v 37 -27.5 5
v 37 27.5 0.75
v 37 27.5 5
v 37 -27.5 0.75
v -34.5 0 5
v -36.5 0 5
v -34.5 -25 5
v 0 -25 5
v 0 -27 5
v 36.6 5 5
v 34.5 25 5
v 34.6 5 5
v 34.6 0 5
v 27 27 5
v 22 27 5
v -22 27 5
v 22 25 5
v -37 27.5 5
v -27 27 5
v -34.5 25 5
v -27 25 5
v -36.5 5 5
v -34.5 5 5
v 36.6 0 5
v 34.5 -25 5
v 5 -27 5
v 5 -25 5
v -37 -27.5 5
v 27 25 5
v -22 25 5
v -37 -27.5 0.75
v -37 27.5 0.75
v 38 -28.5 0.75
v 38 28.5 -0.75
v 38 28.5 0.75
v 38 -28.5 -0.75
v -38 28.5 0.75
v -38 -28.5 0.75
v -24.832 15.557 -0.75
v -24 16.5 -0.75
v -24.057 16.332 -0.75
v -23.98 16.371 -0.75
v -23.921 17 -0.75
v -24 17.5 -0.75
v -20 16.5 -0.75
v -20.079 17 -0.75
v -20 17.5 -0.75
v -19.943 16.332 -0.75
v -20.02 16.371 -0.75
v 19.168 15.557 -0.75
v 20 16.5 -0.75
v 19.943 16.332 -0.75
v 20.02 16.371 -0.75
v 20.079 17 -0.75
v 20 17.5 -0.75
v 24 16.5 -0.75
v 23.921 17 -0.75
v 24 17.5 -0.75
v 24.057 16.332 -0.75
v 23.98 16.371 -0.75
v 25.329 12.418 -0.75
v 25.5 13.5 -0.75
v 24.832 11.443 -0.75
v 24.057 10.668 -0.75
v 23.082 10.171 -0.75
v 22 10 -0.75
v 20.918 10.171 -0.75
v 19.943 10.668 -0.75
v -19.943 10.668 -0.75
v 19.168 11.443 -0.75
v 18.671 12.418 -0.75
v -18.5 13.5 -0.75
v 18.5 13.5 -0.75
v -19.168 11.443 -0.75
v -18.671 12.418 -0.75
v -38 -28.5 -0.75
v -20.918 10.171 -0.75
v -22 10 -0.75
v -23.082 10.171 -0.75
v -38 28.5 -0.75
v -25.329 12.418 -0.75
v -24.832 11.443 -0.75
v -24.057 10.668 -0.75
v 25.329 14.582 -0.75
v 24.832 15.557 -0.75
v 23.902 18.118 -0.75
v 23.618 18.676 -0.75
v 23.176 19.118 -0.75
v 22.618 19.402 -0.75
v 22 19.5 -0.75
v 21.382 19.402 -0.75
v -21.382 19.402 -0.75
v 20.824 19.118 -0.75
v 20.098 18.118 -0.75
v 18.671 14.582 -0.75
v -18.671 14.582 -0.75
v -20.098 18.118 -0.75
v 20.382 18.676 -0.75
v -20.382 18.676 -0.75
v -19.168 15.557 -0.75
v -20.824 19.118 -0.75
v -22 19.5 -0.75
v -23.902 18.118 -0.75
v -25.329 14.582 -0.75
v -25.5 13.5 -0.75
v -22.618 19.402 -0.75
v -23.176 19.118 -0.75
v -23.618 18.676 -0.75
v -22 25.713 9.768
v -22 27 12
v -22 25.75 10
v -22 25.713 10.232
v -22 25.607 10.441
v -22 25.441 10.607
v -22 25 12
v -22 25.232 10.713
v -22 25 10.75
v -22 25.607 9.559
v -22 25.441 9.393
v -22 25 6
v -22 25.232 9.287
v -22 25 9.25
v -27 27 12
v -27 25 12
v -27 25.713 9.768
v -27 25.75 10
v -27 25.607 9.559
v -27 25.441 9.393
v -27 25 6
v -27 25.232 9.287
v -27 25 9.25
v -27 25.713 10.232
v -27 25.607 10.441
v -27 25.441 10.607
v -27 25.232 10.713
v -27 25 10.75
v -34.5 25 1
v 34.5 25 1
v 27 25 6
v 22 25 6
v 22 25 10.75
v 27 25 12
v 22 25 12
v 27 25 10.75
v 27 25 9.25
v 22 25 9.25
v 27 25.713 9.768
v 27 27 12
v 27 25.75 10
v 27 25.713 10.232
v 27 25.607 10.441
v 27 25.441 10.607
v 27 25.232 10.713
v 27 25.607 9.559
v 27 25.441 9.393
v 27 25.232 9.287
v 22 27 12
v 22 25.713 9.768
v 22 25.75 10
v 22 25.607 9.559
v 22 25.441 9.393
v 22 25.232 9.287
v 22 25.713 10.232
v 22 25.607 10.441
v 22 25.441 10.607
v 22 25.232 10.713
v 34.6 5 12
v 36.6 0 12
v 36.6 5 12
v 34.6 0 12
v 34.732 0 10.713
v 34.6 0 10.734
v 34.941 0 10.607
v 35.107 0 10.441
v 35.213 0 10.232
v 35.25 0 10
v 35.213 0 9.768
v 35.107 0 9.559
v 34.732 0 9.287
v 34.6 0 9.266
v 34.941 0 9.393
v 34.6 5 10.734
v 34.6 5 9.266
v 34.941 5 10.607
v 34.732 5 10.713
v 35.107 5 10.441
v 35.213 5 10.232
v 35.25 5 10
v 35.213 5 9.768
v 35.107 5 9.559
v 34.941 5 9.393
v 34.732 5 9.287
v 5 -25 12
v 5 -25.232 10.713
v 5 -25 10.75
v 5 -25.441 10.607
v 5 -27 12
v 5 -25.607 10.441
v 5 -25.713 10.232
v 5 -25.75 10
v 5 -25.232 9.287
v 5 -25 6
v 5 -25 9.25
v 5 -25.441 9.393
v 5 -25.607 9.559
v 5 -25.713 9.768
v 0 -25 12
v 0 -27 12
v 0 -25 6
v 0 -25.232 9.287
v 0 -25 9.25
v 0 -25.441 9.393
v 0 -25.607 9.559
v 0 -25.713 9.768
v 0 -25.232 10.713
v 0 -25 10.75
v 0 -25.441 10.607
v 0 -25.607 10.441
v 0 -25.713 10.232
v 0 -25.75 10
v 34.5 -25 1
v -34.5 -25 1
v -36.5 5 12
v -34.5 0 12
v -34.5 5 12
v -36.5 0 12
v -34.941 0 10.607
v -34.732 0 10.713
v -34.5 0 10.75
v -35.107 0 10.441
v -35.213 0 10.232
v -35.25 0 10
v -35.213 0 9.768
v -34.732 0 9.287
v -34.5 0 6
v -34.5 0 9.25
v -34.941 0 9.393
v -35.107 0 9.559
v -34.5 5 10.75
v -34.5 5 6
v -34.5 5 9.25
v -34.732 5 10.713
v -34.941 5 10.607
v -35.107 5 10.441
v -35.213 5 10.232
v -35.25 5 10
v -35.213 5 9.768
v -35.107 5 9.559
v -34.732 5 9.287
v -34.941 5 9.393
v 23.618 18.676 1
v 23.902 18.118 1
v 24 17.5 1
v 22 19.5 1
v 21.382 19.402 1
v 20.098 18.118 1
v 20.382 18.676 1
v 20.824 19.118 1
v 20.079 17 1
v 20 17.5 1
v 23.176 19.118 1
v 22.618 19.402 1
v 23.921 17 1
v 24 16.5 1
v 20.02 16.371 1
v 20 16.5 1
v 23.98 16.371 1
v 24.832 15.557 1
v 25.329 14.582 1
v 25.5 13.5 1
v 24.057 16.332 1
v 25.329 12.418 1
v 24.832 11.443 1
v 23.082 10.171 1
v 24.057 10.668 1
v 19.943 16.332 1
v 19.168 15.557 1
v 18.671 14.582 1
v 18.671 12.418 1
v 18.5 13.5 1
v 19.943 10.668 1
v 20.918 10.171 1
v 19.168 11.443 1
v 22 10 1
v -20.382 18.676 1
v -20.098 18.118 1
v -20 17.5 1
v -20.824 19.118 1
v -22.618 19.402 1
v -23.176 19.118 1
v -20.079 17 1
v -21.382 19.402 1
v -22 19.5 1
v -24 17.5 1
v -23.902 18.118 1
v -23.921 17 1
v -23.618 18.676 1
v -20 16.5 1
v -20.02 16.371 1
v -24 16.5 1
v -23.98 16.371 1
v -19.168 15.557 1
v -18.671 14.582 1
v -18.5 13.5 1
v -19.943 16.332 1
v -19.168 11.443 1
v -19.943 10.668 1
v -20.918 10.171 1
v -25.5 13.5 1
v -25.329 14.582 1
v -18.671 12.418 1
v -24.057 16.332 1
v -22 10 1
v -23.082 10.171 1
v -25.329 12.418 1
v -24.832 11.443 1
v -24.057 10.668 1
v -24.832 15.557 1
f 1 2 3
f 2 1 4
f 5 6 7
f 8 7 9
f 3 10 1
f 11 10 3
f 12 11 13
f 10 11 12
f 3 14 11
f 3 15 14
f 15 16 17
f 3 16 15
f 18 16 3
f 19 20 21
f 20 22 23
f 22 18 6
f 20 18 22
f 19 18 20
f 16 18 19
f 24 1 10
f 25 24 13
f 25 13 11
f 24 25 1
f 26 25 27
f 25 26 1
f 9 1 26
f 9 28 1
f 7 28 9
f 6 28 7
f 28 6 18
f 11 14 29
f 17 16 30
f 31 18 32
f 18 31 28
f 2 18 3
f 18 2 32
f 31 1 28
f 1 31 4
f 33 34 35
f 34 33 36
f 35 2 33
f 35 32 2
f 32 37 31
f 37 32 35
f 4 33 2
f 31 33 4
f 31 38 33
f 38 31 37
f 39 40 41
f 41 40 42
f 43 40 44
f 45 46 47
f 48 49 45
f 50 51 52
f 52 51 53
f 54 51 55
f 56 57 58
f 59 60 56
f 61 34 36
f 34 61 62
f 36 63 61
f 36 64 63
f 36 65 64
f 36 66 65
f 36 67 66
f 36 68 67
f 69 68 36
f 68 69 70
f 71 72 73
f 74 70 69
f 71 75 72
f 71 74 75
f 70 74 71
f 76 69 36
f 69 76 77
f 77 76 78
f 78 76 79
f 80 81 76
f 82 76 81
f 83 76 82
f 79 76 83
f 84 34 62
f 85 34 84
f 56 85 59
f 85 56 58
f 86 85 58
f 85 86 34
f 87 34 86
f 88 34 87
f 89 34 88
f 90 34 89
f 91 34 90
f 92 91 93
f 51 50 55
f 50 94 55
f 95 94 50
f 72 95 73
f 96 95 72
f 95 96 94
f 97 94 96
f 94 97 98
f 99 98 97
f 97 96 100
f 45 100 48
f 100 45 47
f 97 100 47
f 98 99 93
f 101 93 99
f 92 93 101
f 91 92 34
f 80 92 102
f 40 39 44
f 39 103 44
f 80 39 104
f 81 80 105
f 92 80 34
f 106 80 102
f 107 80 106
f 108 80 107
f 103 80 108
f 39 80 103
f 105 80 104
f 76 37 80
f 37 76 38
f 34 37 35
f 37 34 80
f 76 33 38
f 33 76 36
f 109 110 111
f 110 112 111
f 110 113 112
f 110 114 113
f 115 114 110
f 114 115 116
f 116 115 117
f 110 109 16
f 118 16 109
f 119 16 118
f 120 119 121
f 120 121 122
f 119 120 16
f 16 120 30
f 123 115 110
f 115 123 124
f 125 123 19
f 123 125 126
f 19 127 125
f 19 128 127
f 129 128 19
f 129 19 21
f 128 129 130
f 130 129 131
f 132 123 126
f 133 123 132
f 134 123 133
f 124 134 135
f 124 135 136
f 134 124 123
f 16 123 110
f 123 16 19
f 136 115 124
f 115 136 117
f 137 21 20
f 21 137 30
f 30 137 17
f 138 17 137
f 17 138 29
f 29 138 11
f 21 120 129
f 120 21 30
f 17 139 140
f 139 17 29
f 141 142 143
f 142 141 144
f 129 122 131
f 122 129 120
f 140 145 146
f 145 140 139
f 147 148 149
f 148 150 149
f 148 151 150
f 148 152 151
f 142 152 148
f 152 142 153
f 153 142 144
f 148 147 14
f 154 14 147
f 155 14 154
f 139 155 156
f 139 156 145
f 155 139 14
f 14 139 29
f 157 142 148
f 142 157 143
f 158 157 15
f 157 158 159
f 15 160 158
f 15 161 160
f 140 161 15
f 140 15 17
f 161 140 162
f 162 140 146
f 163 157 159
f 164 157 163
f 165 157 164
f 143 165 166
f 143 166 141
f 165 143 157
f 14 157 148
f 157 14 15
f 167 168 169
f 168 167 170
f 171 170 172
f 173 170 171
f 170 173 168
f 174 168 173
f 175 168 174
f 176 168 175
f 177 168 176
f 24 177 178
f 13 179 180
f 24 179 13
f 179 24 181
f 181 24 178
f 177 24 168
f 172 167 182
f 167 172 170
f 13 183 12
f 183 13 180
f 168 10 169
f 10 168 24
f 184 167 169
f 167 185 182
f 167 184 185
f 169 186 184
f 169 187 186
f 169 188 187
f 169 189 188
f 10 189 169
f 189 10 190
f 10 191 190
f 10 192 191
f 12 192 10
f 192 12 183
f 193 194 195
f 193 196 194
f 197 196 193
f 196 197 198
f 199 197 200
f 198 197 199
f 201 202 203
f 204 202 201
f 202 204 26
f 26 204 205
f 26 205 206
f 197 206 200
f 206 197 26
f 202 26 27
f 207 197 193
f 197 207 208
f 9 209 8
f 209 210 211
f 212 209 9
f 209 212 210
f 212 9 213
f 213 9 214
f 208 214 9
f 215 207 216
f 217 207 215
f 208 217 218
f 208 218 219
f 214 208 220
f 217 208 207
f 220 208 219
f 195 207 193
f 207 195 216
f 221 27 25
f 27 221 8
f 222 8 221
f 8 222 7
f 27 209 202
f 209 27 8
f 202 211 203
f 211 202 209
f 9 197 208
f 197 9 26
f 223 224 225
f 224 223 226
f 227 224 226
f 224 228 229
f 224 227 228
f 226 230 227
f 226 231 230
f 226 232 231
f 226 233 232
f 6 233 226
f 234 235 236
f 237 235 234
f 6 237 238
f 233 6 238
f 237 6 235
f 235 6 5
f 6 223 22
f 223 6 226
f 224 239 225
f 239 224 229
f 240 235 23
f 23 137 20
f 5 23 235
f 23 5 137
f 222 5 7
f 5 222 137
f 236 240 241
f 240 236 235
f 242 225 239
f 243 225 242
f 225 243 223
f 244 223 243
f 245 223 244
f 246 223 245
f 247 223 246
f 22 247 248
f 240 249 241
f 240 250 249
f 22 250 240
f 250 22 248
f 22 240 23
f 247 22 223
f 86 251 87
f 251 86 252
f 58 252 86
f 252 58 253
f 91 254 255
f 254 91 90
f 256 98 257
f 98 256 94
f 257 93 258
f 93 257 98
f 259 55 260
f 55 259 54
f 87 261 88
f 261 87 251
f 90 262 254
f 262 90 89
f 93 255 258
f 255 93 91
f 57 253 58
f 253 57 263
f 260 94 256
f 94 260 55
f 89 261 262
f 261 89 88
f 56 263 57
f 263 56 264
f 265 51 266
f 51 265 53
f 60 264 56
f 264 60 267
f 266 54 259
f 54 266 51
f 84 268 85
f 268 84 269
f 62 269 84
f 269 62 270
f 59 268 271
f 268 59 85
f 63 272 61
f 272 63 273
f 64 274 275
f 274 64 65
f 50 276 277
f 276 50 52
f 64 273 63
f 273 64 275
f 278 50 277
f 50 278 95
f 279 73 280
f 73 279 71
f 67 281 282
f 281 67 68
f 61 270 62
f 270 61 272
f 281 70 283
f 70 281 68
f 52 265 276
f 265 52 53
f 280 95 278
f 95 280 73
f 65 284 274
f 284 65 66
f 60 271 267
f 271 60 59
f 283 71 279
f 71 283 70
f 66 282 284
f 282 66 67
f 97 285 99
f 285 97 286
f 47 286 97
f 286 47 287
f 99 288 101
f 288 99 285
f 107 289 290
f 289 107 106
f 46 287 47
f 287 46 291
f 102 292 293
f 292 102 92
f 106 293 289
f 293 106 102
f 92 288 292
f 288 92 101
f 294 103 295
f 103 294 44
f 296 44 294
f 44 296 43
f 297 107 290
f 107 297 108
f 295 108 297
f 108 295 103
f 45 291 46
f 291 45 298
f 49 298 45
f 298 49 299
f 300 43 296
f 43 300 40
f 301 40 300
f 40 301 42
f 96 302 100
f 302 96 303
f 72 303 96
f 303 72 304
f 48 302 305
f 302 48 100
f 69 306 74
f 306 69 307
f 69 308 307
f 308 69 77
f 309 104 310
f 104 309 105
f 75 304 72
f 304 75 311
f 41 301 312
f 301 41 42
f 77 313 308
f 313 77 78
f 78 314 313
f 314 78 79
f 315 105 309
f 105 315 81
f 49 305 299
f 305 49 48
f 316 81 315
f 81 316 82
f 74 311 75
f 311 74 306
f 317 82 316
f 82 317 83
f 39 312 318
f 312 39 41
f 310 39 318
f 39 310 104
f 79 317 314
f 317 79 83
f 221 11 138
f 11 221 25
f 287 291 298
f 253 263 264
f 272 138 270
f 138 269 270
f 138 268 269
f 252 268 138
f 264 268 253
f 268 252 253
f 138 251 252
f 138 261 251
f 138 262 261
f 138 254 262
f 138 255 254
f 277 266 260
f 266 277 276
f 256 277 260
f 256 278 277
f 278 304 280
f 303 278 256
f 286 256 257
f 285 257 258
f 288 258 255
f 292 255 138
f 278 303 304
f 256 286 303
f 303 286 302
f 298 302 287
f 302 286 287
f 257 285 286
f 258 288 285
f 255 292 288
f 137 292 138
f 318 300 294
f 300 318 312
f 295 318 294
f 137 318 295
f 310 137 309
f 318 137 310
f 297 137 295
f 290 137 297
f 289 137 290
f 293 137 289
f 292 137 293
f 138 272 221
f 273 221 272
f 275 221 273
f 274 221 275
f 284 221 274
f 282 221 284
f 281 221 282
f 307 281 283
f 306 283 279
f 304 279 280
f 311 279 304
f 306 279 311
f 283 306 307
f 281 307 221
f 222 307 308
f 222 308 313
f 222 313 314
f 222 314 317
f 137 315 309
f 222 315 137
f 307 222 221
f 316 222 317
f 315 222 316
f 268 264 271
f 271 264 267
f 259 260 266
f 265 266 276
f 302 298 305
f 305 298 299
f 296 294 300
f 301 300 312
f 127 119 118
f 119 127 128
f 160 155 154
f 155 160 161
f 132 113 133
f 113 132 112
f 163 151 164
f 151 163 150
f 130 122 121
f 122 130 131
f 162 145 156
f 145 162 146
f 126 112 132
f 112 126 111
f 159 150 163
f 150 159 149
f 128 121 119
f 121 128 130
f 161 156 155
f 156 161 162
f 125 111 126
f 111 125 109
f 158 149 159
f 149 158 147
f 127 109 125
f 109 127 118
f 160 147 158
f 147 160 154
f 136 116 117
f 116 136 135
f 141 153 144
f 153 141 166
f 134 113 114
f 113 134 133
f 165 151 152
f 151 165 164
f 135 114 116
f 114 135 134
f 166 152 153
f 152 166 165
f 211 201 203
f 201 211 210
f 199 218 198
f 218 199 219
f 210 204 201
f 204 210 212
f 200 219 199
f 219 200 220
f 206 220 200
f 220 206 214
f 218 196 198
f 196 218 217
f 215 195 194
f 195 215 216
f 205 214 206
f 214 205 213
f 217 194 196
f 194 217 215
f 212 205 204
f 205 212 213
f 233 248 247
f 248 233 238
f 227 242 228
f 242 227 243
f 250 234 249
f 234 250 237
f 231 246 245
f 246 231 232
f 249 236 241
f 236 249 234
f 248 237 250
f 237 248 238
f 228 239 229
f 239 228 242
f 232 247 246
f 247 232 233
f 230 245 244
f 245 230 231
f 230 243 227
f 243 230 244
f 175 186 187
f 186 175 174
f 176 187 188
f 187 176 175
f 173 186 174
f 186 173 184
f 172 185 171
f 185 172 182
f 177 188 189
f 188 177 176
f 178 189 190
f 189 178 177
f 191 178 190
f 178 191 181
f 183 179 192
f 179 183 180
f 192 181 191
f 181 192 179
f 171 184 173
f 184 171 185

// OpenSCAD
wallHeigth = 5;
boardHeight =  5;

boardDepth = 51;
boardWidth = 70;

depth = boardDepth + 4;
width = boardWidth + 4;

%translate([0,0,boardHeight+wallHeigth])  cube(size=[boardWidth,boardDepth,.5], center=true);

difference(){
	union(){
	
		translate([-(boardWidth/2)-2,-(boardDepth/2)-2,0]) 
			color([1,0,0]) 
		cube([width,depth,wallHeigth], center=false); // Outside wall
	
		translate([0,0,0]) 
			color([0,0,1]) 
			cube(size=[width+2,depth+2,1.5], center=true); // bottom plate

		pinWidth = 5;
		pinHeigth = boardHeight+2;
		pinDepth = 2;
		
		translate([-(width/2)+10,(depth/2)-2.5,wallHeigth])
			color([0,1,0])
			cube(size=[pinWidth,pinDepth,pinHeigth], center=false);
		
		translate([(width/2)-15,(depth/2)-2.5,wallHeigth]) 
			color([0,1,0]) 
			cube(size=[pinWidth,pinDepth,pinHeigth], center=false);
		
		translate([(width/2)-.4,0,wallHeigth])
			color([0,1,0]) 
			rotate(a=[0,0,90]) 
			cube(size=[pinWidth,pinDepth,pinHeigth], center=false);
		
		translate([0,-(depth/2)+.5,wallHeigth]) 
			color([0,1,0]) 
			cube(size=[pinWidth,pinDepth,pinHeigth], center=false);
		
		translate([-(width/2)+2.5,0,wallHeigth]) 
			color([0,1,0]) 
			rotate(a=[0,0,90]) 
			cube(size=[pinWidth,pinDepth,pinHeigth], center=false);

		//$fn=20;

		//translate([-7,9.2,0]) rotate(a=[0,90,0]) cylinder(h = 5, r=1, center=true);
		//translate([7,9.2,0]) rotate(a=[0,90,0]) cylinder(h = 5, r=1, center=true);
		//translate([-7,-9.2,0]) rotate(a=[0,90,0]) cylinder(h = 5, r=1, center=true);
		//translate([7,-9.2,0]) rotate(a=[0,90,0]) cylinder(h = 5, r=1, center=true);
	}
	
	union(){
		$fn=20;
		translate([-(boardWidth/2)+.5,-(boardDepth/2)+.5,1]) cube([width-5,depth-5,wallHeigth], center=false); // carve out box
		
		KeyHole((width/2)-15, (depth/2)-5);
		KeyHole(-(width/2)+15, (depth/2)-5);
		
		//translate([(width/2)-5,(depth/2)-5,-2])  cylinder(h = 5, r=1, center=true);
		
		barRad = .75;
		
		translate([0,(depth/2)-2.5 ,boardHeight+wallHeigth]) rotate(a=[0,90,0]) cylinder(h = width, r=barRad, center=true);
		translate([0,-(depth/2)+2.5,boardHeight+wallHeigth]) rotate(a=[0,90,0]) cylinder(h = width, r=barRad, center=true);
		translate([-(width/2)+2.5,0,boardHeight+wallHeigth]) rotate(a=[90,0,0]) cylinder(h = depth, r=barRad, center=true);
		translate([(width/2)-2.5,0 ,boardHeight+wallHeigth]) rotate(a=[90,0,0]) cylinder(h = depth, r=barRad, center=true);
	}
}

module KeyHole(iwidth, idepth){
		translate([iwidth,idepth-5,0])  cylinder(h = 5, r=2, center=true);
		translate([iwidth,idepth-6,0])  cylinder(h = 5, r=2, center=true);
		translate([iwidth,idepth-7,0])  cylinder(h = 5, r=2, center=true);
		translate([iwidth,idepth-9,0])  cylinder(h = 5, r=3.5, center=true);
}
